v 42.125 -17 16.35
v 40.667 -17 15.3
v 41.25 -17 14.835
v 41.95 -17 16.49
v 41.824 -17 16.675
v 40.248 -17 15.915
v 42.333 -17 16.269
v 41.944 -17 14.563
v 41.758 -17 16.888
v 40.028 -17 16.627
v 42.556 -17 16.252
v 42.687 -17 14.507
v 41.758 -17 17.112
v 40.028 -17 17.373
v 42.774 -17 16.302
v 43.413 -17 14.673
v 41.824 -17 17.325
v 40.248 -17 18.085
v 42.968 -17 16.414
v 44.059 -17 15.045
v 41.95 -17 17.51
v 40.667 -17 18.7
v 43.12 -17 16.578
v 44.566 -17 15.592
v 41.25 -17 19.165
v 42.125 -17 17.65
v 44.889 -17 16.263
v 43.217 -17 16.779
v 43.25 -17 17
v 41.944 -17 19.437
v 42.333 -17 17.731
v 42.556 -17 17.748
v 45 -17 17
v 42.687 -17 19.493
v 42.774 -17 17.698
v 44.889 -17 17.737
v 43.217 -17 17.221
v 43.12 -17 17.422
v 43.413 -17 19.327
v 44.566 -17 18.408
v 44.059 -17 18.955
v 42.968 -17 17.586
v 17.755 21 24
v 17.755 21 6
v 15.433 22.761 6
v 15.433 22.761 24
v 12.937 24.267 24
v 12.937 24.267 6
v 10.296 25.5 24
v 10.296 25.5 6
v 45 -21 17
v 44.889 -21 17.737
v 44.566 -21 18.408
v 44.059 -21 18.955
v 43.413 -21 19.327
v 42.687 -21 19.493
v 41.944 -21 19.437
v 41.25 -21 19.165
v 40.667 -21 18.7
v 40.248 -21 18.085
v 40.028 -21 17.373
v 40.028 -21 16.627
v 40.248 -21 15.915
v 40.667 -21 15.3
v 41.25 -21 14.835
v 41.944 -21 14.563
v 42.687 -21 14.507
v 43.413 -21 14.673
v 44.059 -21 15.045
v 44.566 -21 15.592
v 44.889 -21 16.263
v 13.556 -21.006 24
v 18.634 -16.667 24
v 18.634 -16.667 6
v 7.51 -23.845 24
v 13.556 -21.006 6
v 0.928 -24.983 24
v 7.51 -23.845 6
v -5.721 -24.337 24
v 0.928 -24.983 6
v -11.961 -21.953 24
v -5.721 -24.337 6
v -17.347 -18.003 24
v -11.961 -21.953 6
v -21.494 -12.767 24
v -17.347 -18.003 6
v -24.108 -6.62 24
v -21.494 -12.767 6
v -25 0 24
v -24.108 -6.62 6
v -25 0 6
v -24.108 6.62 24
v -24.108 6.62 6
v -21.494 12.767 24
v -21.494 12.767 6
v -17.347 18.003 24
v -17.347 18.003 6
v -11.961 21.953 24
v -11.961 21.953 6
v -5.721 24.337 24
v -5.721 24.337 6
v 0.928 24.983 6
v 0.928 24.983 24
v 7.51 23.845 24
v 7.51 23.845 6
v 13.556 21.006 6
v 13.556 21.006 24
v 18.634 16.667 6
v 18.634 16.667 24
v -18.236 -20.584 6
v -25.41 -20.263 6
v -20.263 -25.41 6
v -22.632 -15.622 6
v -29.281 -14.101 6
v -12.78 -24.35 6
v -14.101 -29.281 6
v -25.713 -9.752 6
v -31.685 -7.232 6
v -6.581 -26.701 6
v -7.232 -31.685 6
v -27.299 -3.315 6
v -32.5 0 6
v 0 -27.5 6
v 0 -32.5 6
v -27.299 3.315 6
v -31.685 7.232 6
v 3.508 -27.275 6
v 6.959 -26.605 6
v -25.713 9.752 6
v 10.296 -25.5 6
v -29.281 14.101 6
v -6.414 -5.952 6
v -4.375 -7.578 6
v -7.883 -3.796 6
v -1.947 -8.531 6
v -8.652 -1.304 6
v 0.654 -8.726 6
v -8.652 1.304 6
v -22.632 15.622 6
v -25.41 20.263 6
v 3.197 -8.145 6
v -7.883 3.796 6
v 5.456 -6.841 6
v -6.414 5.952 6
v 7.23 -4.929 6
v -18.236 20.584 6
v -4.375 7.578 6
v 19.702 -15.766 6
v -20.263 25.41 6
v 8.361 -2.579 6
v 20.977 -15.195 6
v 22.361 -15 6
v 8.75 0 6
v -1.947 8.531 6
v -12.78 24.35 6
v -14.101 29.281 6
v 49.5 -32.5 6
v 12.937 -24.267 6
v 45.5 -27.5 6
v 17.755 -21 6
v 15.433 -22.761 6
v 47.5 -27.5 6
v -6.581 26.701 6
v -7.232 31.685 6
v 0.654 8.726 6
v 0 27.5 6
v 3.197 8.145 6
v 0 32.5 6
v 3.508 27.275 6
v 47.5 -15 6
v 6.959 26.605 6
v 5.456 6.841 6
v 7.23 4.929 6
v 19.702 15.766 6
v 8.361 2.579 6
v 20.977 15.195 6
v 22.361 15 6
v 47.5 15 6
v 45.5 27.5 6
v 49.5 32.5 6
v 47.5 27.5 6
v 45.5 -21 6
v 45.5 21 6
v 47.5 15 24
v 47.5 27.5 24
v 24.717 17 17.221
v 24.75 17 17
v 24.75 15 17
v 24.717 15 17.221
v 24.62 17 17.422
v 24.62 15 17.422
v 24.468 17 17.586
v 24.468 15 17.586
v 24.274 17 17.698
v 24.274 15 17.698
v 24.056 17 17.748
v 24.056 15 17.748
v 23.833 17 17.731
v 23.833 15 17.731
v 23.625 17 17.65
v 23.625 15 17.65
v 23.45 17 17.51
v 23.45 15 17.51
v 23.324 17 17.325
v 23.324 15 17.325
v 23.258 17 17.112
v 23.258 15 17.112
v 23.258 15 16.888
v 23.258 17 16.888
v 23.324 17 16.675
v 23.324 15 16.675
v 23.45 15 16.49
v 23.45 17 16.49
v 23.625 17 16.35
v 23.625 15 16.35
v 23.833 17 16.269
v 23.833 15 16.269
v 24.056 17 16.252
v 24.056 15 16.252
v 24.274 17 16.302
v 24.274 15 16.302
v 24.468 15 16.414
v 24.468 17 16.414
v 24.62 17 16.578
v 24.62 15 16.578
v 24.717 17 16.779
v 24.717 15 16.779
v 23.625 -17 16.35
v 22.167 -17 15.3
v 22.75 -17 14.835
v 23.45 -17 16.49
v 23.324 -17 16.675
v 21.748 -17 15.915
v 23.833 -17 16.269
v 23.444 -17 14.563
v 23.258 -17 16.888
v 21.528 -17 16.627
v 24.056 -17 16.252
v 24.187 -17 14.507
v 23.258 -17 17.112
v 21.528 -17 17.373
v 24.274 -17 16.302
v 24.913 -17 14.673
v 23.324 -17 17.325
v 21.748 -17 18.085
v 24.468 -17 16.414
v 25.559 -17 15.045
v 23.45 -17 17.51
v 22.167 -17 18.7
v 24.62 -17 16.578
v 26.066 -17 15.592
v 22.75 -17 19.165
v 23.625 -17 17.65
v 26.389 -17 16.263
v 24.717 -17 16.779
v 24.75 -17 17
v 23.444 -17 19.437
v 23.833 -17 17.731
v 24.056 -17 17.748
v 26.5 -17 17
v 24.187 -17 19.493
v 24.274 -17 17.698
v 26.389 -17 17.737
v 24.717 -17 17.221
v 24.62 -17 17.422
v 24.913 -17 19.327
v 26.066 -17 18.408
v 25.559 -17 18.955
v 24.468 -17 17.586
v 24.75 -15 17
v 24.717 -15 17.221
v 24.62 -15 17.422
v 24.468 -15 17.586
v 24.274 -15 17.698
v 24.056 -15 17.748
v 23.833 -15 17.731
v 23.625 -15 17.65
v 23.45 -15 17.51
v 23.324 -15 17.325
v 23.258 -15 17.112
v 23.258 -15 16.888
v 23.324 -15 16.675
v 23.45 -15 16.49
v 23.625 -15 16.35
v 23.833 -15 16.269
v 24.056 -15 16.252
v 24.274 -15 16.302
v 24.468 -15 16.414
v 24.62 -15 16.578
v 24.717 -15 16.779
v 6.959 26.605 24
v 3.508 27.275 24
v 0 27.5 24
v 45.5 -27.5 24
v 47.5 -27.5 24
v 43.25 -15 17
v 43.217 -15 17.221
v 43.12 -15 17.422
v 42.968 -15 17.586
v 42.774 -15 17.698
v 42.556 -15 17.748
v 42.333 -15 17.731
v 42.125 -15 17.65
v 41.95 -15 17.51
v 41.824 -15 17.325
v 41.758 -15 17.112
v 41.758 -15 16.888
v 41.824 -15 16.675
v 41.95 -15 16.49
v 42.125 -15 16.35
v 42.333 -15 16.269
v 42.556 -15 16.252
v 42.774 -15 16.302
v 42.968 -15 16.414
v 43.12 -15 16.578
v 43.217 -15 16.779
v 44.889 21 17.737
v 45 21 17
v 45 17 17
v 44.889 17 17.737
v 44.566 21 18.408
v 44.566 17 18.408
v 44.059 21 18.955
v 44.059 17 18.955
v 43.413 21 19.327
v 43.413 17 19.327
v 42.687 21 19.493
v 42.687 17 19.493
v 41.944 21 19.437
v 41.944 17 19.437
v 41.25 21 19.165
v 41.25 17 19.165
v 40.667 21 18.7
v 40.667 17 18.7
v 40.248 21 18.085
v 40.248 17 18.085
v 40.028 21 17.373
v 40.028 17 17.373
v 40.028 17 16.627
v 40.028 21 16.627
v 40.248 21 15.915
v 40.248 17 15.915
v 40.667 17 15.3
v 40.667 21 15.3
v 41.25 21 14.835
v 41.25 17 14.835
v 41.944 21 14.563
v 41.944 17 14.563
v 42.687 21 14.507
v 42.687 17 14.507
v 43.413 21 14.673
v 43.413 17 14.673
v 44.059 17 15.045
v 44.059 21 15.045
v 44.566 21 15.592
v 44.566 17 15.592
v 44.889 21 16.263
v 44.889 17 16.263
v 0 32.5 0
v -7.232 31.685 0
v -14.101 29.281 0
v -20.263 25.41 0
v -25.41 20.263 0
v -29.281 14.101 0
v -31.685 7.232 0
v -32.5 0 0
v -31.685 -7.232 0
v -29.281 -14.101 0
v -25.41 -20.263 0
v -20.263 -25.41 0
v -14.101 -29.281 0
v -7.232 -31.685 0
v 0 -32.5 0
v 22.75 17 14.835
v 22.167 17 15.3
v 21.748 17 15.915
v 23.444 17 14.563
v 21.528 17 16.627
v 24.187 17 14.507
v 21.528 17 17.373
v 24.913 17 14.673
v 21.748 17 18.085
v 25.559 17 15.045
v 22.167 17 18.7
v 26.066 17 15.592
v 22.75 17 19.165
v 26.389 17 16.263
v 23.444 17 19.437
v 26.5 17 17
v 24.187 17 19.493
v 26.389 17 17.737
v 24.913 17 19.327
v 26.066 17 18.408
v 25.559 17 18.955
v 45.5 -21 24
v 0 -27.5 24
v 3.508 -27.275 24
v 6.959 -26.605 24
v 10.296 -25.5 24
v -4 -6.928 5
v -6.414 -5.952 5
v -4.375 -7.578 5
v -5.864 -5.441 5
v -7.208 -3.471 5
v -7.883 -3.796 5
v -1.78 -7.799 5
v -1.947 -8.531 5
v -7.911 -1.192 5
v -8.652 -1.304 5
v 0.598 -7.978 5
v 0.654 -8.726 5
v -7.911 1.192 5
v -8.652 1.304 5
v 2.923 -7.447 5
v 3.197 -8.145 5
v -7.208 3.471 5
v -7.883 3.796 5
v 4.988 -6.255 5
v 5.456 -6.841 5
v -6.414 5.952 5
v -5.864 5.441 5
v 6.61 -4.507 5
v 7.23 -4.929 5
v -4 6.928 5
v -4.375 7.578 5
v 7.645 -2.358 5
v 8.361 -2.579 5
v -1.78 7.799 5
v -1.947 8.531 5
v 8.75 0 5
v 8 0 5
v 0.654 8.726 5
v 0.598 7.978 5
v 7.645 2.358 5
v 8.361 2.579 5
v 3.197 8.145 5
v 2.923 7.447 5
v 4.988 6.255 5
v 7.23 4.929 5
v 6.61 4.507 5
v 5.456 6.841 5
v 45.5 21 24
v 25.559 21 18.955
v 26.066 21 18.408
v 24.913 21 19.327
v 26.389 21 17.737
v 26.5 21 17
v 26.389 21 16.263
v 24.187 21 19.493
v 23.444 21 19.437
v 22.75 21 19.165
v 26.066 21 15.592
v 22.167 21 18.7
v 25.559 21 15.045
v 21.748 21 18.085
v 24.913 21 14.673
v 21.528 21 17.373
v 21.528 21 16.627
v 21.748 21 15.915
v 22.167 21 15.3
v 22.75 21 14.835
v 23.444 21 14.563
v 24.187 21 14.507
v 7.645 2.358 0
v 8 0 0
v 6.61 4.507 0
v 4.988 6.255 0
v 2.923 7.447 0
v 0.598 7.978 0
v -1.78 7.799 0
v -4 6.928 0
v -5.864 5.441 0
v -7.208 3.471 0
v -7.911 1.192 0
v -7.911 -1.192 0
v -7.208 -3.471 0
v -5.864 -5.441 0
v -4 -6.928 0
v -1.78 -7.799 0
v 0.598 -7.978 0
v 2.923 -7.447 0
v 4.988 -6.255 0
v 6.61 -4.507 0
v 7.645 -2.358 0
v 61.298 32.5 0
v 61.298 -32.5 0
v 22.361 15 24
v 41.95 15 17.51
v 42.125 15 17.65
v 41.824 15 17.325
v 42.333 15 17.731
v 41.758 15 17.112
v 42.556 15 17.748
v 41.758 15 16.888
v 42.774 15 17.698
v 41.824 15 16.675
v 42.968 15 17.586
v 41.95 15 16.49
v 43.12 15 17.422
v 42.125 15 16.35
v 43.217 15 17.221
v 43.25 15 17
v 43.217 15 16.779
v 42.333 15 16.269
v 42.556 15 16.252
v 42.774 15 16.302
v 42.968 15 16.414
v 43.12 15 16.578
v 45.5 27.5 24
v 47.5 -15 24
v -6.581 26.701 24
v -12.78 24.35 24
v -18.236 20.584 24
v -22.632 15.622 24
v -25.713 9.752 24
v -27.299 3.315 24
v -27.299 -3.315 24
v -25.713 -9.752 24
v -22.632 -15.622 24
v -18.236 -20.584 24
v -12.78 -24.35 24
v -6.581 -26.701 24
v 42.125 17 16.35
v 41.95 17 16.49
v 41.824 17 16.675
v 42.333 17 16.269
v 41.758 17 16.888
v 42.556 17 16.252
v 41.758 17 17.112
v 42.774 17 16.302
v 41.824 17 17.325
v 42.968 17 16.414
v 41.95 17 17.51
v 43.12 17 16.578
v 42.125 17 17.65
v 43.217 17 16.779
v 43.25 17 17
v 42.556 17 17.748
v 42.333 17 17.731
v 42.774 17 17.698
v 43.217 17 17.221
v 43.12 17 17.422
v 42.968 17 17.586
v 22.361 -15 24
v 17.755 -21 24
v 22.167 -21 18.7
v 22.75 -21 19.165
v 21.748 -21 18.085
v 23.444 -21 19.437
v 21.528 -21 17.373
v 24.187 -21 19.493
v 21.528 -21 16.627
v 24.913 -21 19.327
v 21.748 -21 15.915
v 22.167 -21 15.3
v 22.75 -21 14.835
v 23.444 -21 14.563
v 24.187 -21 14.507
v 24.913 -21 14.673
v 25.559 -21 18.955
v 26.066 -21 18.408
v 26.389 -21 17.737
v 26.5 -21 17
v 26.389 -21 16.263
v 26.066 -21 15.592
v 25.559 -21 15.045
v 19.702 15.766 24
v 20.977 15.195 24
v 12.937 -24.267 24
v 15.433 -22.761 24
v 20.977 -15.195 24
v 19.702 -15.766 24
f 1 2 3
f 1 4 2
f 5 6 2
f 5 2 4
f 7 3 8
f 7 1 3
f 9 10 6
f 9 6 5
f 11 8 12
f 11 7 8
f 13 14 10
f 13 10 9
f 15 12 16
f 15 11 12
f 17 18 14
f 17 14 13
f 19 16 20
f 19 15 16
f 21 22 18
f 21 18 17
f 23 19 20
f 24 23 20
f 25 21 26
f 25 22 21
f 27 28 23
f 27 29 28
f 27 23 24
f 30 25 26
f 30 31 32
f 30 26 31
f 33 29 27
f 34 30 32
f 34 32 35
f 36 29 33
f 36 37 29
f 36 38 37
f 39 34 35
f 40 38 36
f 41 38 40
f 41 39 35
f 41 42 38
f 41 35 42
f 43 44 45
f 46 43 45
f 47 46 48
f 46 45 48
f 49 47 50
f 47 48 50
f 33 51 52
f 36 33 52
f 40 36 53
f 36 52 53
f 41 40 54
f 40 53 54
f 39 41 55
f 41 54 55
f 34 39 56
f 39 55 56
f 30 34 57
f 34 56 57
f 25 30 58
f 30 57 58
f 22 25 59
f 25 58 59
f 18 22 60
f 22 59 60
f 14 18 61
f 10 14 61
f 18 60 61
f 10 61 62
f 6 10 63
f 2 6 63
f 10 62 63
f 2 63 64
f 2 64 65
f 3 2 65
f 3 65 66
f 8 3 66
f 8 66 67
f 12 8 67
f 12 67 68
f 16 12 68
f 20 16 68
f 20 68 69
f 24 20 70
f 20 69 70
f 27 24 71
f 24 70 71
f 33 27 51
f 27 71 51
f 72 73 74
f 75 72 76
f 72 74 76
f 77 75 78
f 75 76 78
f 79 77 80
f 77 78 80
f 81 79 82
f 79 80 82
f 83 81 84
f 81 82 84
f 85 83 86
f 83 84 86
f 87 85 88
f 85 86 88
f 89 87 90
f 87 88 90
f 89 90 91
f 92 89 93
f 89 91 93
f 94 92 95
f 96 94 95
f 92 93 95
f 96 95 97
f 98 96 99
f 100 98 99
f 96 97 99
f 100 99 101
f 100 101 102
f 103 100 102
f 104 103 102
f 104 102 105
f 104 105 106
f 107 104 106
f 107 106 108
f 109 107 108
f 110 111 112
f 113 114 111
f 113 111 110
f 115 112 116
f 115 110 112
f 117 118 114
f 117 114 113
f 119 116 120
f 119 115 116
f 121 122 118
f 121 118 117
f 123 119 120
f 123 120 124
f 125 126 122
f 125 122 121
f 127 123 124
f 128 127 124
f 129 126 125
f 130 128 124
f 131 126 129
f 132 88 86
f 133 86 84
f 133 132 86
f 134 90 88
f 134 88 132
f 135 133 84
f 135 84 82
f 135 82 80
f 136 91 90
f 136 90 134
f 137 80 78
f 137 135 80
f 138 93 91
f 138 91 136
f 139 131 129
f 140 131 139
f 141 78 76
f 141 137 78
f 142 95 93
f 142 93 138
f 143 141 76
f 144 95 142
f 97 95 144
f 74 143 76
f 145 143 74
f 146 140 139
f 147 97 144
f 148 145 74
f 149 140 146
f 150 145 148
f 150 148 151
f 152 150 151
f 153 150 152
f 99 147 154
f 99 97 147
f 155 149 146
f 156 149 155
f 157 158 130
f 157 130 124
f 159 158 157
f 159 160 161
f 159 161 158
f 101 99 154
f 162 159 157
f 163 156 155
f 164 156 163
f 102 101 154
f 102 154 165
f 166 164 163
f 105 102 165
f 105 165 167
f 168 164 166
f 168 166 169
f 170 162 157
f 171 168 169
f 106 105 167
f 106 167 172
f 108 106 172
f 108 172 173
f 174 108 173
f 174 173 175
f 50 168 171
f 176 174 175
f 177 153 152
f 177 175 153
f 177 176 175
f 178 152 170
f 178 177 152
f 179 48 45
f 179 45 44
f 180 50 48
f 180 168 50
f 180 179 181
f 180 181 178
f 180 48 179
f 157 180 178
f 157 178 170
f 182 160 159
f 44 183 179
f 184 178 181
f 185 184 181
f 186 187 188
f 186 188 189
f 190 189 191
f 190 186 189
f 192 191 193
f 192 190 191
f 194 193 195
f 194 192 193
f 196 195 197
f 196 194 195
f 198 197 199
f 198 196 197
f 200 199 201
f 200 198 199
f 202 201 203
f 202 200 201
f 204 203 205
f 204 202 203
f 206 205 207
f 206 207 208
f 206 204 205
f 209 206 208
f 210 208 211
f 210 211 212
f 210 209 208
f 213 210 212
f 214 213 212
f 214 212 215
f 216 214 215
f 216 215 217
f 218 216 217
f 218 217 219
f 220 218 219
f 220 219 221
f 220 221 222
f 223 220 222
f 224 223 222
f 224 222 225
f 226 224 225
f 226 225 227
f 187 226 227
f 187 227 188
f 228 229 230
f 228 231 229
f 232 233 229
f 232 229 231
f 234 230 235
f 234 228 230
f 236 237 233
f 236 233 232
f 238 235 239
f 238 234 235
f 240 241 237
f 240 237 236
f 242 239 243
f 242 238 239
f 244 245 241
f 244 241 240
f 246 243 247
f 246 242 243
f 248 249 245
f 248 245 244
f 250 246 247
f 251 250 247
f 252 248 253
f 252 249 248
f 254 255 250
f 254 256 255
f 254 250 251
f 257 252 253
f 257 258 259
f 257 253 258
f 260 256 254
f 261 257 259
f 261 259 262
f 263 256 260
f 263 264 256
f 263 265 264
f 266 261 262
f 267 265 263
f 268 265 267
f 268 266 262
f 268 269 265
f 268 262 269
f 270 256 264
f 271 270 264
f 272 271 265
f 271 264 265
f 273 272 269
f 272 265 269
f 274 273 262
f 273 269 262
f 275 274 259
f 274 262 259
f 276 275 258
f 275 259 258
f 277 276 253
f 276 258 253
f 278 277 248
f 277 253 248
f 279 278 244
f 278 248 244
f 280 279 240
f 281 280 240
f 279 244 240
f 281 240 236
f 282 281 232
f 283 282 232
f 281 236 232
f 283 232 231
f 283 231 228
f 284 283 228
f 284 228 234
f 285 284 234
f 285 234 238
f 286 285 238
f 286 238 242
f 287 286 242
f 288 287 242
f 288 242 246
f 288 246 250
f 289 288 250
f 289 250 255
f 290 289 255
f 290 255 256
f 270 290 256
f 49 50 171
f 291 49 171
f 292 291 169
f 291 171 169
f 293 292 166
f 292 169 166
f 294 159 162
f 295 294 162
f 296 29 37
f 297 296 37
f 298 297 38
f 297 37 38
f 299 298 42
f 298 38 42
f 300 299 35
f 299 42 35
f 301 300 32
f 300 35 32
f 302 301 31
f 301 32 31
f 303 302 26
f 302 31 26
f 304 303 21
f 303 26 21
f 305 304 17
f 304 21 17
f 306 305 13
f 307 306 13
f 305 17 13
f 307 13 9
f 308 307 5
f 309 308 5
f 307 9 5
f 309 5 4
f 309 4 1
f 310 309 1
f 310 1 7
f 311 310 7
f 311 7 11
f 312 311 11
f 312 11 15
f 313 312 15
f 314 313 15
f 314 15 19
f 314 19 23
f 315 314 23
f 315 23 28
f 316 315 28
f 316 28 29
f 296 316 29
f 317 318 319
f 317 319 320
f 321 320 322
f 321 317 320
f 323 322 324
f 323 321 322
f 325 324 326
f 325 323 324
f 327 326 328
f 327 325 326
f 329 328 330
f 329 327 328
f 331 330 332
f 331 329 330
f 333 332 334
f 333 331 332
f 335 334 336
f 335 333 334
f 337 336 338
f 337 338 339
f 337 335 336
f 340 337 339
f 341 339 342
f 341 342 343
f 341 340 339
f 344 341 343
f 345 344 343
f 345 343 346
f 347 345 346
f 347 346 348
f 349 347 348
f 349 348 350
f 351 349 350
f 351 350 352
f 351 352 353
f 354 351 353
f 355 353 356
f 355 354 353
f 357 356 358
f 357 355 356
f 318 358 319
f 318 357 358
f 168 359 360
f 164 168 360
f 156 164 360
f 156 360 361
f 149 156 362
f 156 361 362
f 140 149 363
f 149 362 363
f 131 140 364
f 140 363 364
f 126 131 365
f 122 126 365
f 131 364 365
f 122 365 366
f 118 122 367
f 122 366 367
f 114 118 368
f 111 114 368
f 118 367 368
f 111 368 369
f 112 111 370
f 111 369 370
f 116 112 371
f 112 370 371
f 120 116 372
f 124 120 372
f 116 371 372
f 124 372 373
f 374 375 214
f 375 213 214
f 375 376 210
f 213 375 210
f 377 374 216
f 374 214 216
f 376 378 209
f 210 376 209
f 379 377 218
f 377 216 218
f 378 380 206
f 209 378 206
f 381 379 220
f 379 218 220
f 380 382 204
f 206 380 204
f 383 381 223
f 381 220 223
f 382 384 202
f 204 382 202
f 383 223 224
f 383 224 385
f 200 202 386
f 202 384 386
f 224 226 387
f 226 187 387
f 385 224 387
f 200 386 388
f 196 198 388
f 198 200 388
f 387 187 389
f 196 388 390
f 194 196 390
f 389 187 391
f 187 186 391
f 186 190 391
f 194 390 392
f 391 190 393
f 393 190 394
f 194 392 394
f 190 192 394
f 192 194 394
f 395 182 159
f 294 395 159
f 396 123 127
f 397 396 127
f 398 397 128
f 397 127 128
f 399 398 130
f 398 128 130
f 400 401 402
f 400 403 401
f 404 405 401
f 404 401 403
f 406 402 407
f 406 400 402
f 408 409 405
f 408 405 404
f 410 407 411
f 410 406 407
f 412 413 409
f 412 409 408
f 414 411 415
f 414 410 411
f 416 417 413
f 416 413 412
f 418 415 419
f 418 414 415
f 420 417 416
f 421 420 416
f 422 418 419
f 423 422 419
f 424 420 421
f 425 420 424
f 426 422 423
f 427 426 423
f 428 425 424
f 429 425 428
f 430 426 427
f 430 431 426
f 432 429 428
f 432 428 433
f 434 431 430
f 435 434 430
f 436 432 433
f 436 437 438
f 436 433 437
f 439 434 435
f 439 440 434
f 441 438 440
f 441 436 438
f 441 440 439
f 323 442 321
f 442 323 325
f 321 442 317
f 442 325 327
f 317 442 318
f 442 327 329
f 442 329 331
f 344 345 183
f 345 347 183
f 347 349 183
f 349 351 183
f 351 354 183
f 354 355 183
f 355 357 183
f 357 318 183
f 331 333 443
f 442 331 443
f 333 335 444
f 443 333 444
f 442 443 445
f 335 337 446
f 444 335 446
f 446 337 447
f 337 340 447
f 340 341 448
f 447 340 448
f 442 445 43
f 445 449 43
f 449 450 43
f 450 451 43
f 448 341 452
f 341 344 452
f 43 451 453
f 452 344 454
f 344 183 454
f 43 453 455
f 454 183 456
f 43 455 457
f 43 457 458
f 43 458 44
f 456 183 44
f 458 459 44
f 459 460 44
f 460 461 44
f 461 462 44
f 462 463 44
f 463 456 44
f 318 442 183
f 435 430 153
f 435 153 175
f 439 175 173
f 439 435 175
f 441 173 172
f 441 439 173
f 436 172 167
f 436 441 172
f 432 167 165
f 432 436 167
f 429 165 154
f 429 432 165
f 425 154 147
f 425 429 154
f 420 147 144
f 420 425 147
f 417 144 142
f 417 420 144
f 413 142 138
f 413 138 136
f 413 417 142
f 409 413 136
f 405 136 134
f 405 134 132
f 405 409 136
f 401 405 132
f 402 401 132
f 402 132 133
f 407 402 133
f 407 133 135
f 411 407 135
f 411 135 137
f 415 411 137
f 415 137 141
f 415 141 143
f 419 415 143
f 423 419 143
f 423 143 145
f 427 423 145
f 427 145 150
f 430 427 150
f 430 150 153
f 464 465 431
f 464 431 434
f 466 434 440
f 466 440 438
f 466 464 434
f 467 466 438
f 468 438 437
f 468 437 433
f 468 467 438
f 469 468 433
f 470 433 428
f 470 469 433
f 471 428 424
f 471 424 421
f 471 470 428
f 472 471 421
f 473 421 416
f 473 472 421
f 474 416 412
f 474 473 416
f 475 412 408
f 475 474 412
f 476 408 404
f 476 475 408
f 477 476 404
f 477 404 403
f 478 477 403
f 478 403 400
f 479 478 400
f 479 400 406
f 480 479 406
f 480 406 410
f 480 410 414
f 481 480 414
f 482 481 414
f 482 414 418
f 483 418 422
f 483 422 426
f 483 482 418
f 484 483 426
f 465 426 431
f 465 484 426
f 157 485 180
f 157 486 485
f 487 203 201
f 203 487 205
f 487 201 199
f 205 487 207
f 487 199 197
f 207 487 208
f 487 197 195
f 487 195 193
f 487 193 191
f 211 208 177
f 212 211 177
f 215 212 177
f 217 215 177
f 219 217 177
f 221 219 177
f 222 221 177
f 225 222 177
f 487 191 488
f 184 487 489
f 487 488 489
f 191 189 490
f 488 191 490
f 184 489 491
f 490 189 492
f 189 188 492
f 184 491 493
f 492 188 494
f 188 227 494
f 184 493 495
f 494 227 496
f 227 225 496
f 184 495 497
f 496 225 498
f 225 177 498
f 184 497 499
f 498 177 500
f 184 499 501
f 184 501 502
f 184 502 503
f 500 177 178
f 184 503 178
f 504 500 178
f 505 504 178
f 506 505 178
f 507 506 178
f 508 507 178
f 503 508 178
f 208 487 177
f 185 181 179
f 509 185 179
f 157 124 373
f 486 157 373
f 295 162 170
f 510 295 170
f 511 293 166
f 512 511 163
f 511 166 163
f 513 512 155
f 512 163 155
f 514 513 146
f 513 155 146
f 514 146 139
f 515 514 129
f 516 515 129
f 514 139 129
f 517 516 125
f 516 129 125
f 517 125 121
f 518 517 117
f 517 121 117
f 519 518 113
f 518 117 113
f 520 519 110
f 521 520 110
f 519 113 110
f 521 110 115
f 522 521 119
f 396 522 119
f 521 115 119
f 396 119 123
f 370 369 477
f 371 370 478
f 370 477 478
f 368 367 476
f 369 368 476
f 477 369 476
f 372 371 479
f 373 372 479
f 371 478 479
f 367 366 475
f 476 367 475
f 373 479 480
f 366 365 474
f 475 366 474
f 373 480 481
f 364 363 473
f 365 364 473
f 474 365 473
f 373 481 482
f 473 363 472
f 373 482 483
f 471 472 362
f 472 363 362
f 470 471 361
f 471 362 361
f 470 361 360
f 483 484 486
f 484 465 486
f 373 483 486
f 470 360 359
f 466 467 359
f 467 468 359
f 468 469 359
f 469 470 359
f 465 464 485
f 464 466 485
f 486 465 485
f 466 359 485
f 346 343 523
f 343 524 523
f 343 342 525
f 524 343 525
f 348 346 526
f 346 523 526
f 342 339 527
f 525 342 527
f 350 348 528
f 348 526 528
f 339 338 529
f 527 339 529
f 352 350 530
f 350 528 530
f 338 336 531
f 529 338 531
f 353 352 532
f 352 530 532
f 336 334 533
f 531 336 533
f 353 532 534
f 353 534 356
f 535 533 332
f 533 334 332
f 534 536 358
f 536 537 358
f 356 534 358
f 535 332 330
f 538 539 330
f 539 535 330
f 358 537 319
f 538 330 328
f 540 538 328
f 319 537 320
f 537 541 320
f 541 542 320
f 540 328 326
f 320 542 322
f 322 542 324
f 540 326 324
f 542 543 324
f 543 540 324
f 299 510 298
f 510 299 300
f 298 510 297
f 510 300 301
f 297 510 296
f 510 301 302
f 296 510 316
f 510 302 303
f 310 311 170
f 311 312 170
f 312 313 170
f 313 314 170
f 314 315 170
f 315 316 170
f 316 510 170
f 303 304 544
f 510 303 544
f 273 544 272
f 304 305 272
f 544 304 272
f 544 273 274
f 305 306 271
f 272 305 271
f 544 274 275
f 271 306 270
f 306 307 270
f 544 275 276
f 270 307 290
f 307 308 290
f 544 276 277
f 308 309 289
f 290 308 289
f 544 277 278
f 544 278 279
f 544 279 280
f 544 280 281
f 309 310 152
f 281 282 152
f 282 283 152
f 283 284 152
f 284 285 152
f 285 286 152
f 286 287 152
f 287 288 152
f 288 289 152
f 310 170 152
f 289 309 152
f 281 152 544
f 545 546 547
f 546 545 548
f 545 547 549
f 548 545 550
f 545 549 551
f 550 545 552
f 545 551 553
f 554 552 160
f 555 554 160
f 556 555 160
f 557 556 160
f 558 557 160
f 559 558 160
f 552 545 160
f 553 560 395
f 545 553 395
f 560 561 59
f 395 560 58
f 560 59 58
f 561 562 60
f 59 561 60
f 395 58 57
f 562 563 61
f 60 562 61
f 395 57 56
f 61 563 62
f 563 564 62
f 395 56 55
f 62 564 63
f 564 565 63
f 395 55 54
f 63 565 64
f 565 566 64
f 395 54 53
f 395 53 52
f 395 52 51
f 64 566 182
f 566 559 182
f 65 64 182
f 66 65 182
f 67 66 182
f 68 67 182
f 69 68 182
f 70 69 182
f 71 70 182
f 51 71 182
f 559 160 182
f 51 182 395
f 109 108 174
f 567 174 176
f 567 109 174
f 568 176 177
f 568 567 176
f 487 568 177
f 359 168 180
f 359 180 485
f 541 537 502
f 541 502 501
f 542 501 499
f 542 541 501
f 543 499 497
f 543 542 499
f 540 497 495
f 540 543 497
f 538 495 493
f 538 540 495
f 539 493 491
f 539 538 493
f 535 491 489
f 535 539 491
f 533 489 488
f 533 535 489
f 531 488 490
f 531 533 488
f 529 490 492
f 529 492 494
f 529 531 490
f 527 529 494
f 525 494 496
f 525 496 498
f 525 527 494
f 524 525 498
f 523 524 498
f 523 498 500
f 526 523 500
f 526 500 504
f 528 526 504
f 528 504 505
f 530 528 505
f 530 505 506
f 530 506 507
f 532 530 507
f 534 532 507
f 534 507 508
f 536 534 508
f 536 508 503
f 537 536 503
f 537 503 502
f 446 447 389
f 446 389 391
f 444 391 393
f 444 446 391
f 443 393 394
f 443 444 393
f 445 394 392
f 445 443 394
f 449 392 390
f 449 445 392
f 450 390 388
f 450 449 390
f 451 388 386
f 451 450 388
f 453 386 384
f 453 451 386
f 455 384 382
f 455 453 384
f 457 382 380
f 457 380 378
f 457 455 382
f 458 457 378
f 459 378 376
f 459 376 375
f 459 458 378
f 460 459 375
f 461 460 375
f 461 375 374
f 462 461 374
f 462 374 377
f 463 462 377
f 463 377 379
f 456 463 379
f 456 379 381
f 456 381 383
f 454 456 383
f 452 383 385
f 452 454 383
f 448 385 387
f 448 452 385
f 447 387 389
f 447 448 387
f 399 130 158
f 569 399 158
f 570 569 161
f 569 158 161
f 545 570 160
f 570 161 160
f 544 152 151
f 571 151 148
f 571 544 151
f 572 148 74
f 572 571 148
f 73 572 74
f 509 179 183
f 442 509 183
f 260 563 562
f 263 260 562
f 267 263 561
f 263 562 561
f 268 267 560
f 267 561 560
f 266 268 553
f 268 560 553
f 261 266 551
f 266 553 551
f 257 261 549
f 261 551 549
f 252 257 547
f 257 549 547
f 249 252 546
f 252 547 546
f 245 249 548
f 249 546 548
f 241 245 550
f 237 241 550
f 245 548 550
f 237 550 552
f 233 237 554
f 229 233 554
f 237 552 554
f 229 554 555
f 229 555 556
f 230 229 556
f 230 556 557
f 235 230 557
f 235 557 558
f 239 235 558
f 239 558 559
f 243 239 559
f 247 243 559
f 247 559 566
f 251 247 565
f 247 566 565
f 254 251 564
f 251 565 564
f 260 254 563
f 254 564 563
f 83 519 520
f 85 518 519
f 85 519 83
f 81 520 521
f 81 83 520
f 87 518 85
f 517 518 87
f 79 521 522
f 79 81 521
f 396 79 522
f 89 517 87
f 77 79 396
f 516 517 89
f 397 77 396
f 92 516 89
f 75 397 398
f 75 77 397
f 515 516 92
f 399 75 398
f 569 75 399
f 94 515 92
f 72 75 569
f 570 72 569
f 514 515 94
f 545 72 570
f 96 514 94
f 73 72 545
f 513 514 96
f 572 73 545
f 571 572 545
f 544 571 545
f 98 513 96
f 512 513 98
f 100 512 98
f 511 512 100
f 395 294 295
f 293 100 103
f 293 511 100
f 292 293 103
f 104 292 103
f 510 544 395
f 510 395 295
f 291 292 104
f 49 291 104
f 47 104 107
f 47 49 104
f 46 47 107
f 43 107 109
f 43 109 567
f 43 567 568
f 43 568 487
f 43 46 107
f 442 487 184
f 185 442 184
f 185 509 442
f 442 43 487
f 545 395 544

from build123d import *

# Parameters (mm, degrees)
F1_DEPTH = 24
F0_R     = 8.75
F2_DEPTH = 6
F4_DEPTH = 32.5
F5_R     = 5
F6_R     = 0.75
F7_DEPTH = 6
F6_R_2   = 2.5
F8_DEPTH = 4
F0_R_2   = 8
F9_DEPTH = 5


# Not quite as in the source:
# - a pattern or mirror of a feature is missing from the dataset's text; its kind, count and spacing are read off the source's solid


with BuildPart() as f1:
    # F0 (on Top) → F1 (new body)
    with BuildSketch(Plane.XY):
        with BuildLine():
            ThreePointArc((20, -15), (-25, 0), (20, 15))
            Line((20, 15), (47.5, 15))
            Line((47.5, 15), (47.5, 27.5))
            Line((47.5, 27.5), (45.5, 27.5))
            Line((45.5, 27.5), (45.5, 21))
            Line((45.5, 21), (39.5, 21))
            Line((39.5, 21), (28, 21))
            Line((28, 21), (17.7552809046, 21))
            ThreePointArc((17.7552809046, 21), (14.2047844975, 23.5472736719), (10.295630141, 25.5))
            ThreePointArc((10.295630141, 25.5), (5.2440442409, 26.9953699734), (0, 27.5))
            ThreePointArc((0, 27.5), (-27.5, 0), (0, -27.5))
            ThreePointArc((0, -27.5), (5.2440442409, -26.9953699734), (10.295630141, -25.5))
            ThreePointArc((10.295630141, -25.5), (14.2047844975, -23.5472736719), (17.7552809046, -21))
            Line((17.7552809046, -21), (28, -21))
            Line((28, -21), (39.5, -21))
            Line((39.5, -21), (45.5, -21))
            Line((45.5, -21), (45.5, -27.5))
            Line((45.5, -27.5), (47.5, -27.5))
            Line((47.5, -27.5), (47.5, -15))
            Line((47.5, -15), (20, -15))
        make_face()
    extrude(amount=F1_DEPTH)

    # F0 (on Top) → F2 (join)
    with BuildSketch(Plane.XY):
        with BuildLine():
            Line((47.5, 15), (20, 15))
            ThreePointArc((20, 15), (-25, 0), (20, -15))
            Line((20, -15), (47.5, -15))
            Line((47.5, -15), (47.5, 15))
        make_face()
        Circle(F0_R, mode=Mode.SUBTRACT)
        with BuildLine():
            Line((45.5, 21), (45.5, 27.5))
            Line((45.5, 27.5), (0, 27.5))
            ThreePointArc((0, 27.5), (5.2440442409, 26.9953699734), (10.295630141, 25.5))
            ThreePointArc((10.295630141, 25.5), (14.2047844975, 23.5472736719), (17.7552809046, 21))
            Line((17.7552809046, 21), (28, 21))
            Line((28, 21), (39.5, 21))
            Line((39.5, 21), (45.5, 21))
        make_face()
        with BuildLine():
            Line((0, -27.5), (45.5, -27.5))
            Line((45.5, -27.5), (45.5, -21))
            Line((45.5, -21), (39.5, -21))
            Line((39.5, -21), (28, -21))
            Line((28, -21), (17.7552809046, -21))
            ThreePointArc((17.7552809046, -21), (14.2047844975, -23.5472736719), (10.295630141, -25.5))
            ThreePointArc((10.295630141, -25.5), (5.2440442409, -26.9953699734), (0, -27.5))
        make_face()
        Polygon((47.5, 27.5), (47.5, 15), (47.5, -15), (47.5, -27.5), (49.5, -27.5), (49.5, 27.5), align=None)
        with BuildLine():
            Line((45.5, 27.5), (47.5, 27.5))
            Line((47.5, 27.5), (49.5, 27.5))
            Line((49.5, 27.5), (49.5, 32.5))
            Line((49.5, 32.5), (0, 32.5))
            ThreePointArc((0, 32.5), (-32.5, 0), (0, -32.5))
            Line((0, -32.5), (49.5, -32.5))
            Line((49.5, -32.5), (49.5, -27.5))
            Line((49.5, -27.5), (47.5, -27.5))
            Line((47.5, -27.5), (45.5, -27.5))
            Line((45.5, -27.5), (0, -27.5))
            ThreePointArc((0, -27.5), (-27.5, 0), (0, 27.5))
            Line((0, 27.5), (45.5, 27.5))
        make_face()
    extrude(amount=F2_DEPTH)

    # F3 (on Front) → F4 (join, symmetric)
    with BuildSketch(Plane.XZ):
        Polygon((49.5, 6), (49.5, 0), (61.2984150648, 0), align=None)
    extrude(amount=F4_DEPTH, both=True)

    # F5
    f5_edges = [f1.edges().sort_by_distance(p)[0] for p in [
        (20, 15, 15),
        (20, -15, 15),
    ]]
    fillet(f5_edges, radius=F5_R)

    # F6 (on face) → F7 (cut, through all)
    with BuildSketch(Plane.XZ.offset(21)):
        with Locations((24, 17)):
            Circle(F6_R)
        with Locations((42.5, 17)):
            Circle(F6_R)
    f7 = extrude(amount=-F7_DEPTH, mode=Mode.SUBTRACT)

    # F7_copies: F7 across plane
    add(f7.mirror(Plane.ZX), mode=Mode.SUBTRACT)

    # F6 (on face) → F8 (cut)
    with BuildSketch(Plane.XZ.offset(21)):
        with Locations((24, 17)):
            Circle(F6_R_2)
        with Locations((24, 17)):
            Circle(F6_R, mode=Mode.SUBTRACT)
        with Locations((42.5, 17)):
            Circle(F6_R_2)
        with Locations((42.5, 17)):
            Circle(F6_R, mode=Mode.SUBTRACT)
    f8 = extrude(amount=-F8_DEPTH, mode=Mode.SUBTRACT)

    # F8_copies: F8 across plane
    add(f8.mirror(Plane.ZX), mode=Mode.SUBTRACT)

    # F0 (on Top) → F9 (join)
    with BuildSketch(Plane.XY):
        Circle(F0_R)
        Circle(F0_R_2, mode=Mode.SUBTRACT)
    extrude(amount=F9_DEPTH)


solid = f1.part
